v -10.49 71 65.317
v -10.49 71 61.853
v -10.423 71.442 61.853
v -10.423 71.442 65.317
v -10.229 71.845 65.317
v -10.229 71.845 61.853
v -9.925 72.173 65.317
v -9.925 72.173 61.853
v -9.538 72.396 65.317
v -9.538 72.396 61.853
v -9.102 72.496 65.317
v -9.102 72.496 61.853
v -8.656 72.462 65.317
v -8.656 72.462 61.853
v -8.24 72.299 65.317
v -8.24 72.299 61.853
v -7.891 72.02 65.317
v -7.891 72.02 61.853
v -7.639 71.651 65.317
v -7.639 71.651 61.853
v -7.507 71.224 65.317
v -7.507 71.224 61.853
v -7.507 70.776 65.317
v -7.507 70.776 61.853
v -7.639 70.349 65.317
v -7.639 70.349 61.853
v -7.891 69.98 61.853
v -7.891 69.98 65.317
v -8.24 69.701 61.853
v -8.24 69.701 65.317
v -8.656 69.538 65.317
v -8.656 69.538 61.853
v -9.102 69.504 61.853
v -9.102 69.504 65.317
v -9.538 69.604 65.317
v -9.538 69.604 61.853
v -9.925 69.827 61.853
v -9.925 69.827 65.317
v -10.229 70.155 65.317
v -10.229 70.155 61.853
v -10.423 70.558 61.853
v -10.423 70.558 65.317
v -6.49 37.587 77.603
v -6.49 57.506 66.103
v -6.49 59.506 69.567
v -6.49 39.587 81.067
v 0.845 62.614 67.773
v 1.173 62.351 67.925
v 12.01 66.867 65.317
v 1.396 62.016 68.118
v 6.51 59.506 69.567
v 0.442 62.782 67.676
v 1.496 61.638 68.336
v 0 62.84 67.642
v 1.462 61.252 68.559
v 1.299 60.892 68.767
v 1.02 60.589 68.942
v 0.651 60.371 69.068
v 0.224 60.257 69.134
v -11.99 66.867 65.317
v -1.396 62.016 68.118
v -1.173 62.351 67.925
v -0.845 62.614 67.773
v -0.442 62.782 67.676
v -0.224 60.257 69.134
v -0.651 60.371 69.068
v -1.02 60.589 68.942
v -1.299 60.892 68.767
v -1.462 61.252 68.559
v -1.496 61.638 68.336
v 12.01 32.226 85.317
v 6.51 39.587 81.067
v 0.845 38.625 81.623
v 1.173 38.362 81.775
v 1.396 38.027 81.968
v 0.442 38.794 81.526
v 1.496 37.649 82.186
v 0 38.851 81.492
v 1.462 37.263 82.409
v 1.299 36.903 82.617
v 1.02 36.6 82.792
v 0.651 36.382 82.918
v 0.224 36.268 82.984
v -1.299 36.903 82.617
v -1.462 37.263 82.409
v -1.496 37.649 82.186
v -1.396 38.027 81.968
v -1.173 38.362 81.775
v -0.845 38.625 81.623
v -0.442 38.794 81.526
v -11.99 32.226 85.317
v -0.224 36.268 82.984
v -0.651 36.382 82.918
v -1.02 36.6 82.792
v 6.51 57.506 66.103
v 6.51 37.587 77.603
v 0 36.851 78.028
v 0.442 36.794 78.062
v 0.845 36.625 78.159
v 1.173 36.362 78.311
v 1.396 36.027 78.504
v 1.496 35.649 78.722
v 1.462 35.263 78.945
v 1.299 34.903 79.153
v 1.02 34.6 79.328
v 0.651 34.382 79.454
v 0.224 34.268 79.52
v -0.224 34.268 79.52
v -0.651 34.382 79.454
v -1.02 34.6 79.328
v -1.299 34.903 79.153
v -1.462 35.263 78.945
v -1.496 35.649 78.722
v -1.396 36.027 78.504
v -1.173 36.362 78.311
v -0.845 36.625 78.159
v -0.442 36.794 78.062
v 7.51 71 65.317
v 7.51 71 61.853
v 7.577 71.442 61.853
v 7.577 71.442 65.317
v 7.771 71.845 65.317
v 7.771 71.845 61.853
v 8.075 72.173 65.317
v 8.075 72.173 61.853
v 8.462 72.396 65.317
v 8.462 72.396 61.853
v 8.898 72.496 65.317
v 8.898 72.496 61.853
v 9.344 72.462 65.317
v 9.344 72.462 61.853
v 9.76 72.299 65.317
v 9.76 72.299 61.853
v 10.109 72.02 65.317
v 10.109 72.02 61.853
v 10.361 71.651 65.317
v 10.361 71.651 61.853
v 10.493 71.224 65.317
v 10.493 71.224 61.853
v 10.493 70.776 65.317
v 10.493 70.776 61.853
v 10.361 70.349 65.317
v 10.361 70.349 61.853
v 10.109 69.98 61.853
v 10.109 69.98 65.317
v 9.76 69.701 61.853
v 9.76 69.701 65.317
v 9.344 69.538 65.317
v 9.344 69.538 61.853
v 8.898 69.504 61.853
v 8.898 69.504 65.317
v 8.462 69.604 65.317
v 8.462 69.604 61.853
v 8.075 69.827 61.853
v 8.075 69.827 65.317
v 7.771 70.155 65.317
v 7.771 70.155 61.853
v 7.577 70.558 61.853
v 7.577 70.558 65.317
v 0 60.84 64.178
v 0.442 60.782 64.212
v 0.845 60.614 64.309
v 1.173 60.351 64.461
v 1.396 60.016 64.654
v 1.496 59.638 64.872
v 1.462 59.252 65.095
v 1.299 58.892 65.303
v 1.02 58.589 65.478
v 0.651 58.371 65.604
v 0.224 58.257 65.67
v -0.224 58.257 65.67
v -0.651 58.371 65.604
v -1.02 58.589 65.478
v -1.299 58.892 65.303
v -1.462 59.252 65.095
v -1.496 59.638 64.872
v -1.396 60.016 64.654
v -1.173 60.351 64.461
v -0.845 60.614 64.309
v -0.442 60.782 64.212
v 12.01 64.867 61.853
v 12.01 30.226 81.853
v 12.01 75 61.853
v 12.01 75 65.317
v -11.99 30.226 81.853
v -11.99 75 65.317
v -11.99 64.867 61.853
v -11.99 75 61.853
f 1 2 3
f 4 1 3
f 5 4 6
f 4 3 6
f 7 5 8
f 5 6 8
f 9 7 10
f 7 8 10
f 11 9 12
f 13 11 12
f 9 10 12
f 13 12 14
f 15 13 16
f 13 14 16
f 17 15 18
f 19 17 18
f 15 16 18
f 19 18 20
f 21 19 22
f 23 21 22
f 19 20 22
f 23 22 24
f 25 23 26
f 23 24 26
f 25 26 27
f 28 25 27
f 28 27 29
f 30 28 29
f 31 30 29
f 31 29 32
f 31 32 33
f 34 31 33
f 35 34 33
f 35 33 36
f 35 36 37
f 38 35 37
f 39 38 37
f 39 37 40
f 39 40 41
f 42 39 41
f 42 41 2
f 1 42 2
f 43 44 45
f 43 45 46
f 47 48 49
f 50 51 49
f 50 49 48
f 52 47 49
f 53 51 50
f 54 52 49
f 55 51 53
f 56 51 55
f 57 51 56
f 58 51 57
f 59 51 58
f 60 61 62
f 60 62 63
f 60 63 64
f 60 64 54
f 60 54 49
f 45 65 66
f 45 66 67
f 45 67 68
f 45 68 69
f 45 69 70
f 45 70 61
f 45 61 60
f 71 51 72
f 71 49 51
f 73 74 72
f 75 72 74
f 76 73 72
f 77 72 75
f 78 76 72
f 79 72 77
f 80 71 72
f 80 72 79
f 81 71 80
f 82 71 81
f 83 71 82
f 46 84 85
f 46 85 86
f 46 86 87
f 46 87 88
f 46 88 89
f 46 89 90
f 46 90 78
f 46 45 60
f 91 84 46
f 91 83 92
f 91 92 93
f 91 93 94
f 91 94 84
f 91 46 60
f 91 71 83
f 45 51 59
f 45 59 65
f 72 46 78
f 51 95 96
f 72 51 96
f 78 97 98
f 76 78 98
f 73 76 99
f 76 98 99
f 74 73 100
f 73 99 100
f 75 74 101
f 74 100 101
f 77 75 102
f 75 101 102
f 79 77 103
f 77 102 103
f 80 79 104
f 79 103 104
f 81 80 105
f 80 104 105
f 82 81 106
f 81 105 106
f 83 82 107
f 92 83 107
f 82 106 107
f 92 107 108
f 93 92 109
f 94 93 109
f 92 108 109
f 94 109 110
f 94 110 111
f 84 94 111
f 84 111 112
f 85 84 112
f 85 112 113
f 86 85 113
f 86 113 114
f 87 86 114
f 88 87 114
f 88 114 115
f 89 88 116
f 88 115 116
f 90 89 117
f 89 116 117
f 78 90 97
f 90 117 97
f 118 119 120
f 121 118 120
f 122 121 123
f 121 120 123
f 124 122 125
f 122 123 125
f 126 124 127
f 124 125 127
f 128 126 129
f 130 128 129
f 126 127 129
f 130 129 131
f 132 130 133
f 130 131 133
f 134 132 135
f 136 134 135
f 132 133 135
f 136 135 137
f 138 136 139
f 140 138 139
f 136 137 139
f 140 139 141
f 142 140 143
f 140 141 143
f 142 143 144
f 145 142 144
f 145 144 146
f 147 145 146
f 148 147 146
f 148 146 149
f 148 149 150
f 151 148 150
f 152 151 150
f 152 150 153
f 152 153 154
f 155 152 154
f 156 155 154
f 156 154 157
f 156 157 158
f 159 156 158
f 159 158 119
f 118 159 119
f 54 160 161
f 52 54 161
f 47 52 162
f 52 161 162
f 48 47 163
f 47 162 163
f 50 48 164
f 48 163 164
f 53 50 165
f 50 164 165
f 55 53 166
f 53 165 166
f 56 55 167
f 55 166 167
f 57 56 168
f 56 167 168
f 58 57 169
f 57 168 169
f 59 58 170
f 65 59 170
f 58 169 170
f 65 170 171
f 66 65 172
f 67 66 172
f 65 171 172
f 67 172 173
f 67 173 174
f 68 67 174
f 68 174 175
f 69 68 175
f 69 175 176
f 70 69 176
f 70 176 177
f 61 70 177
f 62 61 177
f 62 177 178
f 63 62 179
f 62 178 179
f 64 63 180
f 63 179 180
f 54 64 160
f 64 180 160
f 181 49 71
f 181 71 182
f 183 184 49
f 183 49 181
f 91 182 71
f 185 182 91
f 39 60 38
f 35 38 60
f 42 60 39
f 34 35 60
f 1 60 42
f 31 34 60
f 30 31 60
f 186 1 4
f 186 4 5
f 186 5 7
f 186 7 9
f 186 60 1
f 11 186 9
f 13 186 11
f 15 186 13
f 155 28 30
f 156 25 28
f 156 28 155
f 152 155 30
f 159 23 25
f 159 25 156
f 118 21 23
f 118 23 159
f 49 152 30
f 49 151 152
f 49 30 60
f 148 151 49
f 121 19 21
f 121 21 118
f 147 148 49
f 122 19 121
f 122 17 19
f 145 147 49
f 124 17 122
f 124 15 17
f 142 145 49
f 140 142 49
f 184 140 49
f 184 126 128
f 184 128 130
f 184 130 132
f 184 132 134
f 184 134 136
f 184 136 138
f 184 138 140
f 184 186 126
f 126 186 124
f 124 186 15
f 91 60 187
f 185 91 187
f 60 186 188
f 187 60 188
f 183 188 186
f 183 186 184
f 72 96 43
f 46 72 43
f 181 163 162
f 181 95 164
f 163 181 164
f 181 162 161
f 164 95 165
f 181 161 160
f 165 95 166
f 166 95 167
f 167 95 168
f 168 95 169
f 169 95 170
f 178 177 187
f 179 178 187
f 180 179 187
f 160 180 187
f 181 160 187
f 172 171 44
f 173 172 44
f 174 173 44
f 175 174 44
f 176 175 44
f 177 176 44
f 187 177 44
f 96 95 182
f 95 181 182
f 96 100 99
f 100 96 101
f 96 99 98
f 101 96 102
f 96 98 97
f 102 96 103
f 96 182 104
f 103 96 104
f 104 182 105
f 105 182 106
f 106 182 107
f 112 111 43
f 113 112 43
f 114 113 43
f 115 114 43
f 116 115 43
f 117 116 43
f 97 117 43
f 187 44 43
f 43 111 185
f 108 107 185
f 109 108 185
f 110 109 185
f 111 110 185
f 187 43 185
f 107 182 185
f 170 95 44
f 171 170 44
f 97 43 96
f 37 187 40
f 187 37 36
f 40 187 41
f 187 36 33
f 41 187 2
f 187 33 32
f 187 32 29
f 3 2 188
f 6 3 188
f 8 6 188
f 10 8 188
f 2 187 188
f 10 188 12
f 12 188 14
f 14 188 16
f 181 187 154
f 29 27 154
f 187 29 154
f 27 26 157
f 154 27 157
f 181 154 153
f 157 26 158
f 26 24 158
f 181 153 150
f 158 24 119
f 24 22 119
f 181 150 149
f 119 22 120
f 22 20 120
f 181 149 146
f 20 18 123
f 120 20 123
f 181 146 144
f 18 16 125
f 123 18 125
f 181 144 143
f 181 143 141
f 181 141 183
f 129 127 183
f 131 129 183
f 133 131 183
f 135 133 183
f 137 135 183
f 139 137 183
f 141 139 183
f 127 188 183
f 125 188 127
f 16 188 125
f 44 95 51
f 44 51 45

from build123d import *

# Parameters (mm, degrees)
SKETCH_11_W         = 24
SKETCH_11_H         = 40
SKETCH_11_W_2       = 13
SKETCH_11_H_2       = 23
EXTRUDE_1_DEPTH     = 4
SKETCH_12_R         = 1.5
CUT_EXTRUDE_1_DEPTH = 4
EXTRUDE_2_REACH     = 99.098
SKETCH_13_W         = 24
SKETCH_13_H         = 3.464101616
SKETCH_14_R         = 1.5
CUT_EXTRUDE_2_DEPTH = 4


with BuildPart() as part:
    # 草图11 → 凸台-拉伸1 (new body)
    with BuildSketch(Plane(origin=(0, 43, 74.478184725), x_dir=(-1, 0, 0), z_dir=(0, 0.500000000000001, 0.866025403784438))):
        with Locations((-0.009864086, -5.25)):
            Rectangle(SKETCH_11_W, SKETCH_11_H)
        with Locations((-0.009864086, -5.25)):
            Rectangle(SKETCH_11_W_2, SKETCH_11_H_2, mode=Mode.SUBTRACT)
    extrude(amount=EXTRUDE_1_DEPTH)

    # 草图12 → 切除-拉伸1 (cut)
    with BuildSketch(Plane(origin=(0, 43, 74.478184725), x_dir=(-1, 0, 0), z_dir=(0, -0.5000000000000009, -0.8660254037844383))):
        with Locations(Location((0, 19.1, 0), (0, 0, 90))):
            Circle(SKETCH_12_R)
        with Locations(Location((0, -8.6, 0), (0, 0, 90))):
            Circle(SKETCH_12_R)
    extrude(amount=-CUT_EXTRUDE_1_DEPTH, mode=Mode.SUBTRACT)

    # 凸台-拉伸2: up to this face of the body (flat: up to its plane)
    extrude_2_end = Plane(part.part.faces().sort_by_distance((0.009864086, 65.867141446, 63.585235533))[0])
    # 草图13 → 凸台-拉伸2 (add, up to the picked face)
    with BuildSketch(Plane(origin=(0, 75, 0), x_dir=(1, 0, 0), z_dir=(0, 1, 0)), mode=Mode.PRIVATE) as extrude_2_sk1:
        with Locations((0.009864086, -63.585235533)):
            Rectangle(SKETCH_13_W, SKETCH_13_H)
    extrude_2_tool1 = split(extrude(extrude_2_sk1.sketch, amount=-EXTRUDE_2_REACH, mode=Mode.PRIVATE), bisect_by=extrude_2_end, keep=Keep.BOTH, mode=Mode.PRIVATE)
    add(extrude_2_tool1.solids().sort_by(Axis((0.009864, 75, 63.585236), (0, -1, 0)))[0])

    # 草图14 → 切除-拉伸2 (cut)
    with BuildSketch(Plane(origin=(0, 0, 61.853184725), x_dir=(-1, 0, 0), z_dir=(0, 0, -1))):
        with Locations((8.990135914, 71)):
            Circle(SKETCH_14_R)
        with Locations((-9.009864086, 71)):
            Circle(SKETCH_14_R)
    extrude(amount=-CUT_EXTRUDE_2_DEPTH, mode=Mode.SUBTRACT)


solid = part.part
